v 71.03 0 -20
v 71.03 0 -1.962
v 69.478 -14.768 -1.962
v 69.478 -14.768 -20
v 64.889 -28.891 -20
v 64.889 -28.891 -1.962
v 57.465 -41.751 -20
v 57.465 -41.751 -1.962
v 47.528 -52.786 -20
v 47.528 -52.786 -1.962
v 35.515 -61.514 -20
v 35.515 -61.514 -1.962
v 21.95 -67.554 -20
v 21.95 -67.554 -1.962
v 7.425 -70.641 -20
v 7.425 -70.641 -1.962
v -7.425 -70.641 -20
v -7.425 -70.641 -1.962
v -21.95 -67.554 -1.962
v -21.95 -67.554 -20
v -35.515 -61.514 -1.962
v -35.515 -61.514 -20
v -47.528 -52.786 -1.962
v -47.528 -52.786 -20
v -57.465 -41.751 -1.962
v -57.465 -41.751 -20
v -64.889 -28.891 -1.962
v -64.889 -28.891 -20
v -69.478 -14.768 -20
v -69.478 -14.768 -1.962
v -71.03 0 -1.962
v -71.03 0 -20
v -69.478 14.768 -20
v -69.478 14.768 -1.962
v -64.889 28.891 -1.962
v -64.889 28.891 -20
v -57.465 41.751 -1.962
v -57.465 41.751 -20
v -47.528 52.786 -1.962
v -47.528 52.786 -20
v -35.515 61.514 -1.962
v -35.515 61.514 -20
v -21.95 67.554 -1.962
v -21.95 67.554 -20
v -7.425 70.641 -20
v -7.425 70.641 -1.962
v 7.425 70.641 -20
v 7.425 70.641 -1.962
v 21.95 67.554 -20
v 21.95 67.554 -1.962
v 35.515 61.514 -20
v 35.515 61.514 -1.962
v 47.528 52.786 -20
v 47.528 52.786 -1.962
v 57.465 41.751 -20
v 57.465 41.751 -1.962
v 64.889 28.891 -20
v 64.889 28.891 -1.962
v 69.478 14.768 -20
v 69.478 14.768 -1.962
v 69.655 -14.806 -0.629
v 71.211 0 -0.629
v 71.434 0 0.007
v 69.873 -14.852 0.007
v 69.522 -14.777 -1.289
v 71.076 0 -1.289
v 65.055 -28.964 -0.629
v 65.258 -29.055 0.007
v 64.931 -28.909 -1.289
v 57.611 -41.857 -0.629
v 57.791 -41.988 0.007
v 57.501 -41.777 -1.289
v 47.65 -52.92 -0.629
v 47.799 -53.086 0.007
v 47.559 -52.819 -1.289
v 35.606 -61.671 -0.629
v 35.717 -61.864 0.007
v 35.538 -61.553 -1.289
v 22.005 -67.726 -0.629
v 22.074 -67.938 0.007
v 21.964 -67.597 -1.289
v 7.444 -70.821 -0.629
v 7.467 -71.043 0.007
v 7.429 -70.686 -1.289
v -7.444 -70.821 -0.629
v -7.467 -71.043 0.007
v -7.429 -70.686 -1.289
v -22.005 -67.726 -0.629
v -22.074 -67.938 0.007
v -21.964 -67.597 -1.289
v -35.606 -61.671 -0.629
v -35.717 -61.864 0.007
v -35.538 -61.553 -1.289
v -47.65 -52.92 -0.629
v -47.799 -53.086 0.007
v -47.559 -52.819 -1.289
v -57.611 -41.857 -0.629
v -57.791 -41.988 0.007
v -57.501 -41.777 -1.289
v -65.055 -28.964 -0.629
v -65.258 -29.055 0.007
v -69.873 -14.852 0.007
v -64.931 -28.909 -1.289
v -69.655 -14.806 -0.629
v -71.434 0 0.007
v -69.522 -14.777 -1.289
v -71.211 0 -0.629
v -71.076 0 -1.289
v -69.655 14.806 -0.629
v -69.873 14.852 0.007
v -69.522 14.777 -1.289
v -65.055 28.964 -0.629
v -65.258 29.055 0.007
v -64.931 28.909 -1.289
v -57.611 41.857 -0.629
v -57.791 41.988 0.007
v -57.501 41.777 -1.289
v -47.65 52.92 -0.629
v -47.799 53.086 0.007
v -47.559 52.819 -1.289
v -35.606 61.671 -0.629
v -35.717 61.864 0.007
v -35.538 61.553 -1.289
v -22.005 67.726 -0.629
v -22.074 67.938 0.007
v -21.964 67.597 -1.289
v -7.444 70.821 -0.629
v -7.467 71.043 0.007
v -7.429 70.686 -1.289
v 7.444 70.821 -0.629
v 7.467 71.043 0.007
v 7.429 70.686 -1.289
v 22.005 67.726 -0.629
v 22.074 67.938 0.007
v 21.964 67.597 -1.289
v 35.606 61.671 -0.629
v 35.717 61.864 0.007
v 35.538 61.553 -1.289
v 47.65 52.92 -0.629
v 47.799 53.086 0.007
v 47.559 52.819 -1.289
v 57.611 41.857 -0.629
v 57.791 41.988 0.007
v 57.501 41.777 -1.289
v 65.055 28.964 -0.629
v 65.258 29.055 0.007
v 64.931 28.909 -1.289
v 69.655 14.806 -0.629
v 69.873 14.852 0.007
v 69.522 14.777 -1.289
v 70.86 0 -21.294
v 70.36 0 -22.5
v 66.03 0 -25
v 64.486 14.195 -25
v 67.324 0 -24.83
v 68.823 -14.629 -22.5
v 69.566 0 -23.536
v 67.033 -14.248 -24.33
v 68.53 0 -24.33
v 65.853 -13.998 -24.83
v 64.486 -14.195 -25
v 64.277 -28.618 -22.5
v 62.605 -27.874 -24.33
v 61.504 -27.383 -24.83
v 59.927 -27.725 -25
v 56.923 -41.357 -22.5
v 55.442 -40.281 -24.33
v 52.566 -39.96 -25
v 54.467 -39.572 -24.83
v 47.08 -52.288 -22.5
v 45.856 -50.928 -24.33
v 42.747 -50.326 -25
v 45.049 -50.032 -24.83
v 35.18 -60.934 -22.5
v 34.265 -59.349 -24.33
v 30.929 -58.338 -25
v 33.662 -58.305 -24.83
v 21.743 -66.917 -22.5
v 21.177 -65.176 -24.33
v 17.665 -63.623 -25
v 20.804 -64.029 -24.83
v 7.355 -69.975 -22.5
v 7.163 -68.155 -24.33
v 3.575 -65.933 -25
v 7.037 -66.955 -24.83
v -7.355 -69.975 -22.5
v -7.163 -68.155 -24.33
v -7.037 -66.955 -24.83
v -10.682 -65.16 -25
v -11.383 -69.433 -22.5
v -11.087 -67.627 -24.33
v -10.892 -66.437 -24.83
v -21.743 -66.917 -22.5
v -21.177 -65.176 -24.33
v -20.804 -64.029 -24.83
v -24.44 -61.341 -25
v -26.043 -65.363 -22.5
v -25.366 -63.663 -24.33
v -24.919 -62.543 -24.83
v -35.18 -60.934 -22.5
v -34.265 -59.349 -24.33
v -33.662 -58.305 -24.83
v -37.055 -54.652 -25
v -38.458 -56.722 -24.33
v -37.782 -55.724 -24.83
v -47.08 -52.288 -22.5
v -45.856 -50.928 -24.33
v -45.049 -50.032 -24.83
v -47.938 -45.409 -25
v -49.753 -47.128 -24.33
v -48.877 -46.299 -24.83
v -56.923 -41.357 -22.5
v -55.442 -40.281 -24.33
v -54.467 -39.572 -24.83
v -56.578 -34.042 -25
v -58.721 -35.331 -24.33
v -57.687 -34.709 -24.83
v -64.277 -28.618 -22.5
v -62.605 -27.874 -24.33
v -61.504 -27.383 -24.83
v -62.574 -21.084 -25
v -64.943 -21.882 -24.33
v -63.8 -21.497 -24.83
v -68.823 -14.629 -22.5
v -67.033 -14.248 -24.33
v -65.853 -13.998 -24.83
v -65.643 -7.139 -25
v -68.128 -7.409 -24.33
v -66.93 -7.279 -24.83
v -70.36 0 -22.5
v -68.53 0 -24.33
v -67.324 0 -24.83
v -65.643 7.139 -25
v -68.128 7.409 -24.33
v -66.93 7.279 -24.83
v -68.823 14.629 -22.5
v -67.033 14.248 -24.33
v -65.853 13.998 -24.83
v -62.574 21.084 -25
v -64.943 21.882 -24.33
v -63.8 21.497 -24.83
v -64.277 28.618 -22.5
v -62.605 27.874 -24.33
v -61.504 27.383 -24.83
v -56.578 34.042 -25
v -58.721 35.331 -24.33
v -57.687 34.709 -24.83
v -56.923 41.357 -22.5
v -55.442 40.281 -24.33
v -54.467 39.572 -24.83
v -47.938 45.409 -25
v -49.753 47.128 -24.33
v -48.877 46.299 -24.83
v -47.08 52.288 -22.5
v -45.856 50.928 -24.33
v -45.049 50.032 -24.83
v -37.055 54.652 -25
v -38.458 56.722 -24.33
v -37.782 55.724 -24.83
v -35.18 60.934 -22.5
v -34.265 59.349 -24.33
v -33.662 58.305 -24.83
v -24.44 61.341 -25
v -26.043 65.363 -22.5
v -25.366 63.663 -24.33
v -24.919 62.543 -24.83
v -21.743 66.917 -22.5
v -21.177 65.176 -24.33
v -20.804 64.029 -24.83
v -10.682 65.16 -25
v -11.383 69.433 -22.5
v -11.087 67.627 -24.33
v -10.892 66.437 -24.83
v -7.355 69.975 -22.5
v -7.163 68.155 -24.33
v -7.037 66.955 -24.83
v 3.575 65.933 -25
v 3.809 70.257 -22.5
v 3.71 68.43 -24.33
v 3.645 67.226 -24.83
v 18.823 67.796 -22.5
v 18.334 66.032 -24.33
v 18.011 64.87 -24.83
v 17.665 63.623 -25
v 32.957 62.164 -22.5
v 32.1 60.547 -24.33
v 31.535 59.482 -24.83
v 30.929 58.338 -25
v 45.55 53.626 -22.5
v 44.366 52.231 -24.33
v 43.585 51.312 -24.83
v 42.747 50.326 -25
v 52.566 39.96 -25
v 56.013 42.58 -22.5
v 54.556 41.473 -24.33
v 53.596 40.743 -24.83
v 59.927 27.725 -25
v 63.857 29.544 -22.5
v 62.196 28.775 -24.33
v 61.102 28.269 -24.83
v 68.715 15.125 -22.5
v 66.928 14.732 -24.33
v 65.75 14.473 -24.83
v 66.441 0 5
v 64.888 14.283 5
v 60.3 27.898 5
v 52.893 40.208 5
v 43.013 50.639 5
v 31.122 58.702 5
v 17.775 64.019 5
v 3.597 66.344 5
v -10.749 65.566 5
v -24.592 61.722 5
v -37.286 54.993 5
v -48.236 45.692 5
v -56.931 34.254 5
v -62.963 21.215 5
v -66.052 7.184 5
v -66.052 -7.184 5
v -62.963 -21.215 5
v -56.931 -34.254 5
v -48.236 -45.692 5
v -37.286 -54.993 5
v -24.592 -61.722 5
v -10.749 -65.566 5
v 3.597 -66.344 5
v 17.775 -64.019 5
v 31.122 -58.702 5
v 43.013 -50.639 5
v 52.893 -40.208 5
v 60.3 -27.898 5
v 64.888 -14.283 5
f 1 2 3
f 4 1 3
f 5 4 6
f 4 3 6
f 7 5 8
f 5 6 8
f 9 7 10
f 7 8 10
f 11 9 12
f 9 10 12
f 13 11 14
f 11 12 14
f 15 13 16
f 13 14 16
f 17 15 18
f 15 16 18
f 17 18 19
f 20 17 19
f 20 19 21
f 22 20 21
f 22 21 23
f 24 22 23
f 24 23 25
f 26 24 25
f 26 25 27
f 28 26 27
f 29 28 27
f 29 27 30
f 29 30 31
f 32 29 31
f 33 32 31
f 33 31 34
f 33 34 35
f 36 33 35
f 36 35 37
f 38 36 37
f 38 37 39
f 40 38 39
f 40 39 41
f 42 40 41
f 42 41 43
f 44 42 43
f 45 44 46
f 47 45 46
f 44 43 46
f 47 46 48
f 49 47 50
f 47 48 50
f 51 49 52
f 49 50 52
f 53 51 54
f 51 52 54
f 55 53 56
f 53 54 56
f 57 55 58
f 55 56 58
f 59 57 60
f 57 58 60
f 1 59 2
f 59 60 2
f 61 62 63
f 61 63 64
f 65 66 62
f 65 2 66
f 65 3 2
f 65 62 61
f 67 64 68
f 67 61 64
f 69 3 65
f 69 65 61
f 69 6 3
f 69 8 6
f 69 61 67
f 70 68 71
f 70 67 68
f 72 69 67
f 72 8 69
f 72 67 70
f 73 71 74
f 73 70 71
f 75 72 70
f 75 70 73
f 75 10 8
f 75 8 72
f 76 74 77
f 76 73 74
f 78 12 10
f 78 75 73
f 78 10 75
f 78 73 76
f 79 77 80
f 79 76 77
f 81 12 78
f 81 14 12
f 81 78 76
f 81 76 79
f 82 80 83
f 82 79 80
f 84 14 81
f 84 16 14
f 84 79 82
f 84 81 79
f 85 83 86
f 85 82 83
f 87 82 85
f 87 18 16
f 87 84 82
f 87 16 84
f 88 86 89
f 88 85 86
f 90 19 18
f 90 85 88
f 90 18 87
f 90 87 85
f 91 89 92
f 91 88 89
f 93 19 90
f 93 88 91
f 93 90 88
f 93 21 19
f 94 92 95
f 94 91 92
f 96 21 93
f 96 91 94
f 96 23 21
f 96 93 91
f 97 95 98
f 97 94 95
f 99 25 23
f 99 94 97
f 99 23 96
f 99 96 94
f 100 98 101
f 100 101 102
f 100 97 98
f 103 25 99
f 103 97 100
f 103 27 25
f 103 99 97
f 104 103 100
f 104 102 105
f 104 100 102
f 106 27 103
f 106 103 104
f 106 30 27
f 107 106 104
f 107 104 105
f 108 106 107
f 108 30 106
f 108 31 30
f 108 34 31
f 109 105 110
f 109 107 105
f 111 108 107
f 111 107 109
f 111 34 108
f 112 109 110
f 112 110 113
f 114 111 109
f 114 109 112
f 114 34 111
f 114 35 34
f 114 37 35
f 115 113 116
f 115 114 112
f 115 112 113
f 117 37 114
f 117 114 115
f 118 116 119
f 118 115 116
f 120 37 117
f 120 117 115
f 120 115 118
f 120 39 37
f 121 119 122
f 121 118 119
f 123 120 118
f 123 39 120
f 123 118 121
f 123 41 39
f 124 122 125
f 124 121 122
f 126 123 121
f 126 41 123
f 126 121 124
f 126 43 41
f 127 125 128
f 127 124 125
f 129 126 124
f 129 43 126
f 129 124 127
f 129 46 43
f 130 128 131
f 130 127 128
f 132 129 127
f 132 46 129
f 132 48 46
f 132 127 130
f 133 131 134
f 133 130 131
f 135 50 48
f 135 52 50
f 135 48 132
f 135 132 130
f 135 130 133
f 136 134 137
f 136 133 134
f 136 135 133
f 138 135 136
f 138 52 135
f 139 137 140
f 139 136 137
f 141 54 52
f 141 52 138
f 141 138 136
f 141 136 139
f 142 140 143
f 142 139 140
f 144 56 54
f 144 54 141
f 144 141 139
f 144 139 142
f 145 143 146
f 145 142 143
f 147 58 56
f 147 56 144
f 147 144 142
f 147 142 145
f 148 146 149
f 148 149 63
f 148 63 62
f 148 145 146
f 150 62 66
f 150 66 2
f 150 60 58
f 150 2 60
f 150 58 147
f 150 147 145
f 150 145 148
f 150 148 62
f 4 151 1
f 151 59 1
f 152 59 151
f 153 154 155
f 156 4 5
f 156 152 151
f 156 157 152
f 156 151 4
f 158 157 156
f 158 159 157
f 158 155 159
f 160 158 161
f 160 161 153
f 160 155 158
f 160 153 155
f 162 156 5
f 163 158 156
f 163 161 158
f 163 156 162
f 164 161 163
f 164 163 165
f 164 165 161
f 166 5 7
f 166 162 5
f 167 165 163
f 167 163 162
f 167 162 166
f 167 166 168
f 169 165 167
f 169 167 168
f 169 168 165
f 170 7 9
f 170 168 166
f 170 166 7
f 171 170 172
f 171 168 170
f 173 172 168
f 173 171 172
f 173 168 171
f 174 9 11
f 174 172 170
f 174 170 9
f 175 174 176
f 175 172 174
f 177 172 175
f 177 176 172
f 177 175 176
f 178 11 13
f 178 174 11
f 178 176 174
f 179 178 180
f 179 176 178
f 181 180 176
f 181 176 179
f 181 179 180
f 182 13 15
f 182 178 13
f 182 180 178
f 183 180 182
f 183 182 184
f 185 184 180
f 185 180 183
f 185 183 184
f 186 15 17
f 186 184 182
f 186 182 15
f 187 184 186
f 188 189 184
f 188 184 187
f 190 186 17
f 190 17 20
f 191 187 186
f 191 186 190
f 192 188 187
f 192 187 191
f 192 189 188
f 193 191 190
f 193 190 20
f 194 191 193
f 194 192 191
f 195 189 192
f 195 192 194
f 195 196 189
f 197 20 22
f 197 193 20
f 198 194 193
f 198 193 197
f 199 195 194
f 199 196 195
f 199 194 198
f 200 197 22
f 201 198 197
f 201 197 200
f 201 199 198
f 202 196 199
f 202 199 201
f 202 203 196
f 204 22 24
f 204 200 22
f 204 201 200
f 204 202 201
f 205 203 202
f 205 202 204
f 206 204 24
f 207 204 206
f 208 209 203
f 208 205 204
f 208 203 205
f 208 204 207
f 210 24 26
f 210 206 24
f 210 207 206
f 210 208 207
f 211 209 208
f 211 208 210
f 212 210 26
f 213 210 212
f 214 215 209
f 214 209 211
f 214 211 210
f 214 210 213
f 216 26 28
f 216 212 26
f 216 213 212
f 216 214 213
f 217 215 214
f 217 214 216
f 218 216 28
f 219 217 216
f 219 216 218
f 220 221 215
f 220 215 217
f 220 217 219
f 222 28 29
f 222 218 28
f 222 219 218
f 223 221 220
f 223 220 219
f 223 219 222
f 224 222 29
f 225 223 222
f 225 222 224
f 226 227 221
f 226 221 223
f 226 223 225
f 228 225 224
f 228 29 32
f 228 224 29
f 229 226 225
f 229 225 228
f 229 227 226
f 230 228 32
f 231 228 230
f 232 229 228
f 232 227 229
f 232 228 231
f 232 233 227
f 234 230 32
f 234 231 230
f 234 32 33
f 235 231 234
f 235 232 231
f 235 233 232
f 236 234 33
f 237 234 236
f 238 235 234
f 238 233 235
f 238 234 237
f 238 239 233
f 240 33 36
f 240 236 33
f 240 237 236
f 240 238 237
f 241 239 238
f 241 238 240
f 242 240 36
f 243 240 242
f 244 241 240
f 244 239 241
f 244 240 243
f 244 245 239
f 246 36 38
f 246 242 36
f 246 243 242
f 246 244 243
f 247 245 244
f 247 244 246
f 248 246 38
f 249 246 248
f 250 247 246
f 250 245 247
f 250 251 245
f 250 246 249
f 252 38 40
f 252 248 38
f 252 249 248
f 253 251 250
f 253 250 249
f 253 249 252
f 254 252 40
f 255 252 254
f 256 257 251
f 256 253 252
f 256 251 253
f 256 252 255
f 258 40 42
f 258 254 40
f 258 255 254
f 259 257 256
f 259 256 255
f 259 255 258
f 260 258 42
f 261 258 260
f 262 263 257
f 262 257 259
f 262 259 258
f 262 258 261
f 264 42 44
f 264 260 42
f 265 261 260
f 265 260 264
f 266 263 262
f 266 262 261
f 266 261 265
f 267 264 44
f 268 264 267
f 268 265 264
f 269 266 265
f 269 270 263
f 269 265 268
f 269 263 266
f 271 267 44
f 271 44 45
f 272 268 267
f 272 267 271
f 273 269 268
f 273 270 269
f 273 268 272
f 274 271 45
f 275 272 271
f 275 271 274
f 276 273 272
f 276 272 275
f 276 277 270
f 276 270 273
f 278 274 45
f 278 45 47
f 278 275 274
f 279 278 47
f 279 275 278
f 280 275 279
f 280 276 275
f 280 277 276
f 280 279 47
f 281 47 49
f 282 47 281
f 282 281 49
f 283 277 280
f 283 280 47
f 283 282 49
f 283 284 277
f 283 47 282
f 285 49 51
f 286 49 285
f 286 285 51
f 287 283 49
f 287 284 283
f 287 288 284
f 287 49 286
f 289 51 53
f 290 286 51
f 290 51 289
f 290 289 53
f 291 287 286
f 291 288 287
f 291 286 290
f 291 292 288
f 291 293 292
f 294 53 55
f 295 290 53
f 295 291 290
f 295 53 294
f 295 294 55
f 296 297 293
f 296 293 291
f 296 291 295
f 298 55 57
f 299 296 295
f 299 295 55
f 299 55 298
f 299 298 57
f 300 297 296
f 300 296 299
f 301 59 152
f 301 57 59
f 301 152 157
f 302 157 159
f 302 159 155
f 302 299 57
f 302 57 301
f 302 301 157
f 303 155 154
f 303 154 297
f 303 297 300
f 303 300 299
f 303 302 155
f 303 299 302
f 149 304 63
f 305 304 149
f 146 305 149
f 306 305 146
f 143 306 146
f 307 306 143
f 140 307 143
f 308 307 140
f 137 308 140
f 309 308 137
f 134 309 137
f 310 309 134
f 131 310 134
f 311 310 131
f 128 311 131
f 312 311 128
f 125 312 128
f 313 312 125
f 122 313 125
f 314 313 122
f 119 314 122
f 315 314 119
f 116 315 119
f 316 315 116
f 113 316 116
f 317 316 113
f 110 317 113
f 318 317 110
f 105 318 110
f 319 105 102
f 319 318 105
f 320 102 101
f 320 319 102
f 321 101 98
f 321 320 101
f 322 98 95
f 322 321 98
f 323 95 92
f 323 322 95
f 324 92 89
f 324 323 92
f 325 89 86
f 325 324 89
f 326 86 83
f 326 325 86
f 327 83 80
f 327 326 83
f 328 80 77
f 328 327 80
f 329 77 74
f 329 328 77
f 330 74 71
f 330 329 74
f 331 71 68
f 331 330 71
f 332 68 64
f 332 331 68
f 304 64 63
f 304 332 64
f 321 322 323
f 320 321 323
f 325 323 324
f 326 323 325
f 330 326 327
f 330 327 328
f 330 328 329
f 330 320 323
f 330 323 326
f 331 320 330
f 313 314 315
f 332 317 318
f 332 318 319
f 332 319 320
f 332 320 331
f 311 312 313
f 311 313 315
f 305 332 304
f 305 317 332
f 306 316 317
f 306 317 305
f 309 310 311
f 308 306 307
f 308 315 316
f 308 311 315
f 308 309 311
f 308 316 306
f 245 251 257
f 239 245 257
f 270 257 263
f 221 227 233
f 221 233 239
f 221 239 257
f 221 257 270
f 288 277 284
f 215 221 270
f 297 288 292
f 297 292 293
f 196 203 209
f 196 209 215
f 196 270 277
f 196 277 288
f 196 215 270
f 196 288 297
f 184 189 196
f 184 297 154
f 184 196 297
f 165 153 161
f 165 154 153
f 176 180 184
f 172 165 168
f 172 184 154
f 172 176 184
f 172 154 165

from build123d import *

# Parameters (mm, degrees)
F2_R     = 71.4411374157
F3_DEPTH = 5
F4_R     = 71.0302069346
F6_DEPTH = 25
F7_R     = 0.0241421356


# Not quite as in the source:
# - a fillet or chamfer that OpenCascade refuses, or shapes differently, is made with other operations: its cross-section is extruded or revolved along the edge and cut away or added


with BuildPart() as f3:
    # F2 (on Top) → F3 (new body)
    with BuildSketch(Plane.XY):
        Circle(F2_R)
    extrude(amount=F3_DEPTH)

    # F4 (on face) → F6 (join)
    with BuildSketch(Plane(origin=(0, 0, 0), x_dir=(1, 0, 0), z_dir=(0, 0, -1))):
        Circle(F4_R)
    extrude(amount=F6_DEPTH)

    # F7
    f7_edges = [f3.edges().sort_by_distance(p)[0] for p in [
        (-71.441137, 0, 0),
    ]]
    fillet(f7_edges, radius=F7_R)

    # F8: chamfer of 5 on 1 edges, made by hand

    # F8_s1 → F8_t2 (revolve, cut)
    with BuildSketch(Plane.XZ):
        Polygon((71.4411374157, 0), (66.4411374157, 5), (71.4411374157, 5), align=None)
    revolve(axis=Axis((0, 0, 5), (0, 0, 1)), mode=Mode.SUBTRACT)

    # F9: fillet of radius 5 on 3 edges, made by hand

    # F9_s1 → F9_t2 (revolve, cut)
    with BuildSketch(Plane.XZ):
        with BuildLine():
            ThreePointArc((71.0302069346, -20), (69.5657408405, -23.5355339059), (66.0302069346, -25))
            Line((66.0302069346, -25), (66.0302069346, -25.1))
            Line((66.0302069346, -25.1), (71.1302069346, -25.1))
            Line((71.1302069346, -25.1), (71.1302069346, -20))
            Line((71.1302069346, -20), (71.0302069346, -20))
        make_face()
    revolve(axis=Axis((0, 0, -25), (0, 0, -1)), mode=Mode.SUBTRACT)

    # F9_s3 → F9_t4 (revolve)
    with BuildSketch(Plane.XZ):
        with BuildLine():
            ThreePointArc((71.4340663479, 0.0070710678), (71.1322122973, -0.9567431048), (71.0302069346, -1.9615557905))
            Line((71.0302069346, -1.9615557905), (70.9302069346, -1.9615557905))
            Line((70.9302069346, -1.9615557905), (70.9302069346, 0))
            Line((70.9302069346, 0), (71.0302069346, 0.1))
            ThreePointArc((71.0302069346, 0.1), (71.2321366412, 0.1), (71.3421435362, 0.046443605))
            Line((71.3421435362, 0.046443605), (71.4340663479, 0.0070710678))
        make_face()
    revolve(axis=Axis((0, 0, 0), (0, 0, -1)))


solid = f3.part
